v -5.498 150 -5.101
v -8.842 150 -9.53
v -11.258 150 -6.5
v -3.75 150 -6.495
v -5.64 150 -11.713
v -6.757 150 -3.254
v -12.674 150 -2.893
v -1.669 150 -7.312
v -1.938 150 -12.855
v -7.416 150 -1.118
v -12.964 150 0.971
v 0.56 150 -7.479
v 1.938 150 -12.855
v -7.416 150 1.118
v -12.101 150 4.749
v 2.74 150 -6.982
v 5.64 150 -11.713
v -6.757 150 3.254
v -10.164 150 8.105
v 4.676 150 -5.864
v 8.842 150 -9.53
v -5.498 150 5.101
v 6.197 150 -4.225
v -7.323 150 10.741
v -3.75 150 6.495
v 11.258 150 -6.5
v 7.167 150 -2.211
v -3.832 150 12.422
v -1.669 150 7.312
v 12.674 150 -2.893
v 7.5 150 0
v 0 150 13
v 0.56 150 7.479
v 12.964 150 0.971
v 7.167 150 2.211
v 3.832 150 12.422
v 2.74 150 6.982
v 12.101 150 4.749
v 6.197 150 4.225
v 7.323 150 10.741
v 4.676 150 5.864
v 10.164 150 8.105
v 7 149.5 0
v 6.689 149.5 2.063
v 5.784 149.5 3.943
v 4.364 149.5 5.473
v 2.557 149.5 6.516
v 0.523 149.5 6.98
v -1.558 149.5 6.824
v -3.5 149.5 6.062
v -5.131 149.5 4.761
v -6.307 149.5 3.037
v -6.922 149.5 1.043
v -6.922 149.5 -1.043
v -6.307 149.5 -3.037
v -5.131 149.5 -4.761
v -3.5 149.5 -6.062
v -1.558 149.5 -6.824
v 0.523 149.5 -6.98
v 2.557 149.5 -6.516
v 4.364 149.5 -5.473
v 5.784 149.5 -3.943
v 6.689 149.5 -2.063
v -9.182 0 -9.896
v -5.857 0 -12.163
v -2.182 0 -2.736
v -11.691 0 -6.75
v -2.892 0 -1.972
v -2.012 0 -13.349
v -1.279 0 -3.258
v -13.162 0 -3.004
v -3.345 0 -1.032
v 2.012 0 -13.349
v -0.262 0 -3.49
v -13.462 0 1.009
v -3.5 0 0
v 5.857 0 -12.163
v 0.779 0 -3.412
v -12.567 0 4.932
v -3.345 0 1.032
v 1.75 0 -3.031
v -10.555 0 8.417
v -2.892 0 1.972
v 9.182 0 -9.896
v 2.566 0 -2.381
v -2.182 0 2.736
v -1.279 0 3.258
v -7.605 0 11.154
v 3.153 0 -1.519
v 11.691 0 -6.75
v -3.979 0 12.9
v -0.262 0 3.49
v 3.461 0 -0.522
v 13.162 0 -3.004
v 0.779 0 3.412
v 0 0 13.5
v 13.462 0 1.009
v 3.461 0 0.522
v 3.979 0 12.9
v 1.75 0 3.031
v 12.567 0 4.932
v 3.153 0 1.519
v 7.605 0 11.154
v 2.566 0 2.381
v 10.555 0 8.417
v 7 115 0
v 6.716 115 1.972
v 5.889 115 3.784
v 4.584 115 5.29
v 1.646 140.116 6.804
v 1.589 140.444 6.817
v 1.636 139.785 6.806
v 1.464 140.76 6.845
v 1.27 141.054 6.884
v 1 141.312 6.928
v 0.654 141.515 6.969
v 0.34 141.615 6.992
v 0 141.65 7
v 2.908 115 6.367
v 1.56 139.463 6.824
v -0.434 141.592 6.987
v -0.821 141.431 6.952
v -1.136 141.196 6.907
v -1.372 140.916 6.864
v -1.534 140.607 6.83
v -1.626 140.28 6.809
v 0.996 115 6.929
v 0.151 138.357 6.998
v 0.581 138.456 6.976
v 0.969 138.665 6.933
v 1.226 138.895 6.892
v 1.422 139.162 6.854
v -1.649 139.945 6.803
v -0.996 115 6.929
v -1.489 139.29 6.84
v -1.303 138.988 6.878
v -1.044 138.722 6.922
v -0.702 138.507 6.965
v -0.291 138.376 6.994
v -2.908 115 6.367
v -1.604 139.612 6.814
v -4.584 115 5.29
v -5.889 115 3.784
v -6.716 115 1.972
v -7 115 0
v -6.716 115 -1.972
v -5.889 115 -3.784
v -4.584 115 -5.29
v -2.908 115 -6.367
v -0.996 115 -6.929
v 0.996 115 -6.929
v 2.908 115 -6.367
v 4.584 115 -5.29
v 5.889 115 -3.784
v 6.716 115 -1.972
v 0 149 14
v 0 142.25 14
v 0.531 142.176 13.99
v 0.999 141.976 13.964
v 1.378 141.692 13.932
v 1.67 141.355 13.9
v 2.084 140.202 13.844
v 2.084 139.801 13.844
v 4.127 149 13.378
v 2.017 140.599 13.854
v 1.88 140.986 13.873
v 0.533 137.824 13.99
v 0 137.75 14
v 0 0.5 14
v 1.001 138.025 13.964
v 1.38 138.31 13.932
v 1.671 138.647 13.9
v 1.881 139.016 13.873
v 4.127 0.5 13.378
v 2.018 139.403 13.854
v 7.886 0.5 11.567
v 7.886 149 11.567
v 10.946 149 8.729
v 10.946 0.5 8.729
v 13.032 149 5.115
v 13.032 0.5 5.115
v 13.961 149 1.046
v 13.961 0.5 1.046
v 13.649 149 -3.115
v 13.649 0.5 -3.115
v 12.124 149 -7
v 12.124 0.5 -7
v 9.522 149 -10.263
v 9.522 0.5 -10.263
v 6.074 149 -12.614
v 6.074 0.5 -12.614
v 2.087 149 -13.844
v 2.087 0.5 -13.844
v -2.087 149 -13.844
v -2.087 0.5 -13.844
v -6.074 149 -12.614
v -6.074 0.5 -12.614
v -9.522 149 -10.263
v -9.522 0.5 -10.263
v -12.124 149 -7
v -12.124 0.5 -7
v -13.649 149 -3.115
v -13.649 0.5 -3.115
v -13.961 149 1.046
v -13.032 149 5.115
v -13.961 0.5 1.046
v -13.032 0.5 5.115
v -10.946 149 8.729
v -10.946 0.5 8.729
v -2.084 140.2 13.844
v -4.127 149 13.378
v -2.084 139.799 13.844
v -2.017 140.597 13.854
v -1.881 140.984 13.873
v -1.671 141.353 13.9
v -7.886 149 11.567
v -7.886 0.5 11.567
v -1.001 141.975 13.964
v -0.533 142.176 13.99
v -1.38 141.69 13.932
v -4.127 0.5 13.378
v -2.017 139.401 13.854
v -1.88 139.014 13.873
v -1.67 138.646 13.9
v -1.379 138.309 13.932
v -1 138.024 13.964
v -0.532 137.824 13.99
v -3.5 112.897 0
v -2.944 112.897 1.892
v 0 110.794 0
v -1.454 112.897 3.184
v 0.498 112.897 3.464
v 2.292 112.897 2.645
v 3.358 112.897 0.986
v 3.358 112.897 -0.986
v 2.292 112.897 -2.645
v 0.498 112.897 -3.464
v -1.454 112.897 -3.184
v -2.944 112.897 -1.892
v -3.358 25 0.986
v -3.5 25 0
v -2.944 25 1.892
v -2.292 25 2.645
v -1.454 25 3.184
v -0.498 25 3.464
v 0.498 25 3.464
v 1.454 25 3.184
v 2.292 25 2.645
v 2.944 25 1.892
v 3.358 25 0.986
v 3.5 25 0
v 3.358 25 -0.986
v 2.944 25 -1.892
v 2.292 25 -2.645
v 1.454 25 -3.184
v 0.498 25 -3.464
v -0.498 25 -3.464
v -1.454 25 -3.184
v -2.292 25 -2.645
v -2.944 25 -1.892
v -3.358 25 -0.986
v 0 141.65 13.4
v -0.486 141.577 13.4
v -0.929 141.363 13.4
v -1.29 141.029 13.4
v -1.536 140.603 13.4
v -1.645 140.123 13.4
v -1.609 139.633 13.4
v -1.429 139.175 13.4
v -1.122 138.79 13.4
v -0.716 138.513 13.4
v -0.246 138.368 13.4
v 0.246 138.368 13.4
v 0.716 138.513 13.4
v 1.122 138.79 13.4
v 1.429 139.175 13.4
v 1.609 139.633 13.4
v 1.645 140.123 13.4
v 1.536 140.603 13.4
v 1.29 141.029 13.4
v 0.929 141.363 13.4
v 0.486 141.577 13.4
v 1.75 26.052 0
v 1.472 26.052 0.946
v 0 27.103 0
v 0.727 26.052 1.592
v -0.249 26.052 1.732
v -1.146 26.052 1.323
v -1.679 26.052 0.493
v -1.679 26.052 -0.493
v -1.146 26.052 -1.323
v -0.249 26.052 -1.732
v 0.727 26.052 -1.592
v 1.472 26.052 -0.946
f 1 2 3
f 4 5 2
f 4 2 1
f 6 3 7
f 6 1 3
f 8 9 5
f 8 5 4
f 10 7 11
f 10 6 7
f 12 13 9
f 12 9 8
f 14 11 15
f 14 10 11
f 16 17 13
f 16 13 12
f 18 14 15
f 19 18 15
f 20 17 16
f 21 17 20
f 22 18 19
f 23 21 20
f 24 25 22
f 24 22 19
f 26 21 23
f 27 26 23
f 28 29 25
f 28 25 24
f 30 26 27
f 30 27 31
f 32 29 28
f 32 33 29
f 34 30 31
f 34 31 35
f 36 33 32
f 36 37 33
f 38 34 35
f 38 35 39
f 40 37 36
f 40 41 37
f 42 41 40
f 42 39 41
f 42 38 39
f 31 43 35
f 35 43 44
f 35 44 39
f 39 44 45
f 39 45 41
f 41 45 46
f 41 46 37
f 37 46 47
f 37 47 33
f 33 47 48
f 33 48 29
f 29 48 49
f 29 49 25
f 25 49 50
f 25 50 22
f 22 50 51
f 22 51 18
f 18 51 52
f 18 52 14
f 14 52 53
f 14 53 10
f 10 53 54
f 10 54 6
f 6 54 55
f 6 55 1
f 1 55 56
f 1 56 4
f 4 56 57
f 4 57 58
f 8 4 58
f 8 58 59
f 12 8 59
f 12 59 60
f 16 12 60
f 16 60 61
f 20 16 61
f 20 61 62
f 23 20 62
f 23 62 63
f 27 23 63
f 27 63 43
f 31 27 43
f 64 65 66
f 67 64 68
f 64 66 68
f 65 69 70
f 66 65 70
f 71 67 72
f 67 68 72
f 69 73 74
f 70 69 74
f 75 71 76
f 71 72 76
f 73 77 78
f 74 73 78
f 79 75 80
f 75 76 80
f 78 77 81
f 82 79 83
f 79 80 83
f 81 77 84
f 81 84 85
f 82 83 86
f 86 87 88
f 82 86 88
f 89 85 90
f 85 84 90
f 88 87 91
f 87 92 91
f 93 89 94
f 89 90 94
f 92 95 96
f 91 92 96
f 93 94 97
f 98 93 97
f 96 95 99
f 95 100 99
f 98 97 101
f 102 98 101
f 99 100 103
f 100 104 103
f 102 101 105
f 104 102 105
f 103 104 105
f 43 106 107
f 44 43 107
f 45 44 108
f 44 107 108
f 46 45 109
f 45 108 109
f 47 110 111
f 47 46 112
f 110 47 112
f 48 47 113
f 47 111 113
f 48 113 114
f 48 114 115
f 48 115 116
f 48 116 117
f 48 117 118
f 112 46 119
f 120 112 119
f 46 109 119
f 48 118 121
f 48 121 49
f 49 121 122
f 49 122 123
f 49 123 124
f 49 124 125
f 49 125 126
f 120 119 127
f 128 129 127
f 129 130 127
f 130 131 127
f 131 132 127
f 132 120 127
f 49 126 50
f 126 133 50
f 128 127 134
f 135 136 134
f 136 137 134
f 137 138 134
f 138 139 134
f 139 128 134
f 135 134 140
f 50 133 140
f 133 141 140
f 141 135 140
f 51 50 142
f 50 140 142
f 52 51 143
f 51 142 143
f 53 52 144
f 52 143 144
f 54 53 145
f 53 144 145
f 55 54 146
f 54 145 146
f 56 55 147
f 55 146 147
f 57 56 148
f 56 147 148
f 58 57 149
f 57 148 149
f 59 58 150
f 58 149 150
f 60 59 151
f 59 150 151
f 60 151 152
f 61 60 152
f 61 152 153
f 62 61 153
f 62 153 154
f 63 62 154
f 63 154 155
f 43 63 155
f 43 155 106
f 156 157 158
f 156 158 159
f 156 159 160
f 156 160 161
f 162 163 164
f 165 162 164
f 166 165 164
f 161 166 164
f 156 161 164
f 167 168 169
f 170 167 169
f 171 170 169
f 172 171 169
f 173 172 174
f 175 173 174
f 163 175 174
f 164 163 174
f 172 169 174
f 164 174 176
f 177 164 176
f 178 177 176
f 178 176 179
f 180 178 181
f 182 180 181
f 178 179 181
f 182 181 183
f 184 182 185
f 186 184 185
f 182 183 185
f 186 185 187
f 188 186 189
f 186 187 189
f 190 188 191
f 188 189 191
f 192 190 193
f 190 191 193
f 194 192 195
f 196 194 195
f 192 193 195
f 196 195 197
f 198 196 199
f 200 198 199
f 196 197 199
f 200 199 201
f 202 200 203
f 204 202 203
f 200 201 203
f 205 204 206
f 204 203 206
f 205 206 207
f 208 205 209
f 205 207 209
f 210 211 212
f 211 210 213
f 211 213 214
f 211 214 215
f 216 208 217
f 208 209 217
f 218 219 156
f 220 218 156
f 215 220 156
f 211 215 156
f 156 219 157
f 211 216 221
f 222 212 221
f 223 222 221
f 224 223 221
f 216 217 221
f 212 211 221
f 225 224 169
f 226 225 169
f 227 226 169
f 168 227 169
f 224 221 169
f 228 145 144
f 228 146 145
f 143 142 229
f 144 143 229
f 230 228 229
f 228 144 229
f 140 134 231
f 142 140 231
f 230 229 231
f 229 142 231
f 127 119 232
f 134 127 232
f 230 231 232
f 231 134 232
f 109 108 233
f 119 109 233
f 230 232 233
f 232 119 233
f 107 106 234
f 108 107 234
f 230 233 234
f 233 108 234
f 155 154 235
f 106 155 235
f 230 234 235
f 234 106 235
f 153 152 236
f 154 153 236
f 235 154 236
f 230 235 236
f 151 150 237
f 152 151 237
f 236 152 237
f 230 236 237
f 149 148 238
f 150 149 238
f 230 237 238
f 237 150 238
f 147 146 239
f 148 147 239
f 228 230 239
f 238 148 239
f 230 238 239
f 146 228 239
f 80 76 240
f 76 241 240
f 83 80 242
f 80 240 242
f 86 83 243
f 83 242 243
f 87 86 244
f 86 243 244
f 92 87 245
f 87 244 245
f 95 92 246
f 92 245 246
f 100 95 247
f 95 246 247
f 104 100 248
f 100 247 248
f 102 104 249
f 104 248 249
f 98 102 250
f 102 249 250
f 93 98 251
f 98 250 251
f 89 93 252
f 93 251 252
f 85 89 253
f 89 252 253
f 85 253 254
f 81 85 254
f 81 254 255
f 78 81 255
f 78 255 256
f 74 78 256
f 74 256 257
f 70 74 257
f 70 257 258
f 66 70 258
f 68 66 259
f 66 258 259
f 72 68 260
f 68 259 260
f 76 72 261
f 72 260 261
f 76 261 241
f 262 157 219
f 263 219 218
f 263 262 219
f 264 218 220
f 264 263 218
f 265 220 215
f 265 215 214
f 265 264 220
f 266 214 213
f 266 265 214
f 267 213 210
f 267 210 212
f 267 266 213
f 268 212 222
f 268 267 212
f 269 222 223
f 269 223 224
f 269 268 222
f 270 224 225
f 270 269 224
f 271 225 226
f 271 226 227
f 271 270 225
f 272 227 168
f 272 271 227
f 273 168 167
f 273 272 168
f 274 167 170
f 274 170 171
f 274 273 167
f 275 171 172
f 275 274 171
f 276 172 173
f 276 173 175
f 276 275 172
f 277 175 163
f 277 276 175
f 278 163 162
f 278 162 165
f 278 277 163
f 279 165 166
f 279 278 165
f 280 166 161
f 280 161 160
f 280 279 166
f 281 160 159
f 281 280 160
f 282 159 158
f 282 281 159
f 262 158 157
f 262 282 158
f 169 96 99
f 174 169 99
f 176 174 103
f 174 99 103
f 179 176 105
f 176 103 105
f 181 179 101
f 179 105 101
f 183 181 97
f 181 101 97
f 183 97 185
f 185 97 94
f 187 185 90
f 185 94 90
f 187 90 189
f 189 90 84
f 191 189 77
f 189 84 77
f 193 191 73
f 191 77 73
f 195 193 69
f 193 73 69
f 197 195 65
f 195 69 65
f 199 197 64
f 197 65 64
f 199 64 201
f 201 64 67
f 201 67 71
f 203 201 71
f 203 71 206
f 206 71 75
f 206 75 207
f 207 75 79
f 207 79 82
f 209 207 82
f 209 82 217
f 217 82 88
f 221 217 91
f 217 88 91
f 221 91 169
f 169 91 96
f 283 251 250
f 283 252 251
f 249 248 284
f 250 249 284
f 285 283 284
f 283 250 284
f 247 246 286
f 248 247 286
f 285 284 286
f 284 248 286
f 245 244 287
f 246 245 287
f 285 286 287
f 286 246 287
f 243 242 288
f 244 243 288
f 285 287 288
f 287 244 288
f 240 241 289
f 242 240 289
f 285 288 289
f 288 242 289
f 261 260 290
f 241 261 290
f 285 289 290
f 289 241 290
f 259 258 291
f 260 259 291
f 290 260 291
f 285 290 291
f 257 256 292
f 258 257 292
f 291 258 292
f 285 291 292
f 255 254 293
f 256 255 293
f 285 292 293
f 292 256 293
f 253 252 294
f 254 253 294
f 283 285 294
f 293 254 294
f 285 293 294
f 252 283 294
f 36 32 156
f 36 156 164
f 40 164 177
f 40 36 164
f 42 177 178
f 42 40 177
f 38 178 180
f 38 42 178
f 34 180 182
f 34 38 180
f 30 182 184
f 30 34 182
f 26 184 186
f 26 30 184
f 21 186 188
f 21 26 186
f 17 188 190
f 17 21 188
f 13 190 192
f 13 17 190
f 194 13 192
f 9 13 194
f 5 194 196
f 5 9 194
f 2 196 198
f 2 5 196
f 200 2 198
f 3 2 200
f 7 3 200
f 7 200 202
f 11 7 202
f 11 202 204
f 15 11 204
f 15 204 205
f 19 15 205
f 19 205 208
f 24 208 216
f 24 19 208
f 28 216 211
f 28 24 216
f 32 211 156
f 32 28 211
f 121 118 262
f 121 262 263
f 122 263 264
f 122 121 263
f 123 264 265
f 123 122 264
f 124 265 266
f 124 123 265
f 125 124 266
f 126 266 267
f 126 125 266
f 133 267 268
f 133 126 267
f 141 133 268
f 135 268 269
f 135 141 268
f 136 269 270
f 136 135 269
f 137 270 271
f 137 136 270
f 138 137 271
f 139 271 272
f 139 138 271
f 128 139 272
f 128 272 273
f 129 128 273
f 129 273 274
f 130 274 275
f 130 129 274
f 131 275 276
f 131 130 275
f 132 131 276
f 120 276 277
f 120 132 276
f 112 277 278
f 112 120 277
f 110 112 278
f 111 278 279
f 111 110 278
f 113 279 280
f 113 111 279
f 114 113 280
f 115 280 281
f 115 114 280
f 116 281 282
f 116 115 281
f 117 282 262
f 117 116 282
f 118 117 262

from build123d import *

# Parameters (mm, degrees)
ESQUISSE1_R                               = 14
BOSS_EXTRU_1_DEPTH                        = 150
CHANFREIN1_SIZE                           = 1
DIAM_TRE_DU_PER_AGE_14_0_14_1_D           = 14
DIAM_TRE_DU_PER_AGE_14_0_14_1_DEPTH       = 35
DIAM_TRE_DU_PER_AGE_14_0_14_1_CSINK_D     = 15
DIAM_TRE_DU_PER_AGE_14_0_14_1_CSINK_ANGLE = 90
DIAM_TRE_DU_PER_AGE_14_0_14_1_TIP         = 4.206024333
CHANFREIN2_SIZE                           = 0.5
TROU_TARAUD_M8X1_01_D                     = 7
TROU_TARAUD_M8X1_01_DEPTH                 = 25
TROU_TARAUD_M8X1_01_TIP                   = 2.103012167


with BuildPart() as part:
    # Esquisse1 → Boss.-Extru.1 (new body)
    with BuildSketch(Plane(origin=(0, 0, 0), x_dir=(1, 0, 0), z_dir=(0, 1, 0))):
        with Locations(Location((0, 0, 0), (0, 0, 270))):  # turned: the seam where the file's is
            Circle(ESQUISSE1_R)
    extrude(amount=BOSS_EXTRU_1_DEPTH)

    # Chanfrein1
    chanfrein1_edges = [part.edges().sort_by_distance(p)[0] for p in [
        (0, 150, -14),
    ]]
    chamfer(chanfrein1_edges, length=CHANFREIN1_SIZE)

    # Diamètre du perçage Ø14.0 (14)1
    with Locations(Plane(origin=(0, 150, 0), x_dir=(-1, 0, 0), z_dir=(0, 1, 0))):
        with Locations((0, 0)):
            CounterSinkHole(DIAM_TRE_DU_PER_AGE_14_0_14_1_D / 2, DIAM_TRE_DU_PER_AGE_14_0_14_1_CSINK_D / 2, depth=DIAM_TRE_DU_PER_AGE_14_0_14_1_DEPTH, counter_sink_angle=DIAM_TRE_DU_PER_AGE_14_0_14_1_CSINK_ANGLE)
            with Locations((0, 0, -(DIAM_TRE_DU_PER_AGE_14_0_14_1_DEPTH + DIAM_TRE_DU_PER_AGE_14_0_14_1_TIP / 2))):  # 118° drill point
                Cone(0, DIAM_TRE_DU_PER_AGE_14_0_14_1_D / 2, DIAM_TRE_DU_PER_AGE_14_0_14_1_TIP, mode=Mode.SUBTRACT)

    # Chanfrein2
    chanfrein2_edges = [part.edges().sort_by_distance(p)[0] for p in [
        (0, 0, -14),
    ]]
    chamfer(chanfrein2_edges, length=CHANFREIN2_SIZE)

    # Trou taraudé M8x1.01
    with Locations(Plane.XZ):
        with Locations((0, 0)):
            Hole(TROU_TARAUD_M8X1_01_D / 2, depth=TROU_TARAUD_M8X1_01_DEPTH)
            with Locations((0, 0, -(TROU_TARAUD_M8X1_01_DEPTH + TROU_TARAUD_M8X1_01_TIP / 2))):  # 118° drill point
                Cone(0, TROU_TARAUD_M8X1_01_D / 2, TROU_TARAUD_M8X1_01_TIP, mode=Mode.SUBTRACT)

    # Esquisse11 → Trou taraudé M42 (revolve, cut)
    with BuildSketch(Plane(origin=(0, 140, 0), x_dir=(0, 1, 0), z_dir=(1, 0, 0))):
        Polygon((0, 0), (0, 14), (2.25, 14), (1.65, 13.4), (1.65, 0), align=None)
    revolve(axis=Axis((0, 140, -6.35), (0, 0, 1)), mode=Mode.SUBTRACT)


solid = part.part
